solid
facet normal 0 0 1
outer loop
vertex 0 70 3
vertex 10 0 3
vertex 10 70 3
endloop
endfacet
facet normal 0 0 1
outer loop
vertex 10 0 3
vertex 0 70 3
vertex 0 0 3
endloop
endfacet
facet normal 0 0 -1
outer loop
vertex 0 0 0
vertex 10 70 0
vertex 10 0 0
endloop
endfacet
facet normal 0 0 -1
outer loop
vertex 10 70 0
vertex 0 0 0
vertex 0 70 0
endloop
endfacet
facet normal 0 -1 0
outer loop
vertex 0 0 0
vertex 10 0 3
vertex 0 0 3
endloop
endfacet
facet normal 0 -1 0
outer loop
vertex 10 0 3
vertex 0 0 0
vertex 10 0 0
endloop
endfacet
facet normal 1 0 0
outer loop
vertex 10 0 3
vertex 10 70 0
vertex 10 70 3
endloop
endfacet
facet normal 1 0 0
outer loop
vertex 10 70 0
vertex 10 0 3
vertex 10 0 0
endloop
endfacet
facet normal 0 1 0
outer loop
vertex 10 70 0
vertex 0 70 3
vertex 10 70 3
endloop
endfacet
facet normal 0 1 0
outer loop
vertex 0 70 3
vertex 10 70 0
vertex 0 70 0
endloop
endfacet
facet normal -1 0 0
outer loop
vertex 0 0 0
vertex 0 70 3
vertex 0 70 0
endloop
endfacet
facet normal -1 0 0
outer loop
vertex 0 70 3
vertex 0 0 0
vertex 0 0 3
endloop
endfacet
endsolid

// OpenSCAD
cameraHeight = 70;

CameraHolder(cameraHeight = 70);

module CameraHolder(cameraHeight) 
{
    cube([10, cameraHeight, 3]);
}
